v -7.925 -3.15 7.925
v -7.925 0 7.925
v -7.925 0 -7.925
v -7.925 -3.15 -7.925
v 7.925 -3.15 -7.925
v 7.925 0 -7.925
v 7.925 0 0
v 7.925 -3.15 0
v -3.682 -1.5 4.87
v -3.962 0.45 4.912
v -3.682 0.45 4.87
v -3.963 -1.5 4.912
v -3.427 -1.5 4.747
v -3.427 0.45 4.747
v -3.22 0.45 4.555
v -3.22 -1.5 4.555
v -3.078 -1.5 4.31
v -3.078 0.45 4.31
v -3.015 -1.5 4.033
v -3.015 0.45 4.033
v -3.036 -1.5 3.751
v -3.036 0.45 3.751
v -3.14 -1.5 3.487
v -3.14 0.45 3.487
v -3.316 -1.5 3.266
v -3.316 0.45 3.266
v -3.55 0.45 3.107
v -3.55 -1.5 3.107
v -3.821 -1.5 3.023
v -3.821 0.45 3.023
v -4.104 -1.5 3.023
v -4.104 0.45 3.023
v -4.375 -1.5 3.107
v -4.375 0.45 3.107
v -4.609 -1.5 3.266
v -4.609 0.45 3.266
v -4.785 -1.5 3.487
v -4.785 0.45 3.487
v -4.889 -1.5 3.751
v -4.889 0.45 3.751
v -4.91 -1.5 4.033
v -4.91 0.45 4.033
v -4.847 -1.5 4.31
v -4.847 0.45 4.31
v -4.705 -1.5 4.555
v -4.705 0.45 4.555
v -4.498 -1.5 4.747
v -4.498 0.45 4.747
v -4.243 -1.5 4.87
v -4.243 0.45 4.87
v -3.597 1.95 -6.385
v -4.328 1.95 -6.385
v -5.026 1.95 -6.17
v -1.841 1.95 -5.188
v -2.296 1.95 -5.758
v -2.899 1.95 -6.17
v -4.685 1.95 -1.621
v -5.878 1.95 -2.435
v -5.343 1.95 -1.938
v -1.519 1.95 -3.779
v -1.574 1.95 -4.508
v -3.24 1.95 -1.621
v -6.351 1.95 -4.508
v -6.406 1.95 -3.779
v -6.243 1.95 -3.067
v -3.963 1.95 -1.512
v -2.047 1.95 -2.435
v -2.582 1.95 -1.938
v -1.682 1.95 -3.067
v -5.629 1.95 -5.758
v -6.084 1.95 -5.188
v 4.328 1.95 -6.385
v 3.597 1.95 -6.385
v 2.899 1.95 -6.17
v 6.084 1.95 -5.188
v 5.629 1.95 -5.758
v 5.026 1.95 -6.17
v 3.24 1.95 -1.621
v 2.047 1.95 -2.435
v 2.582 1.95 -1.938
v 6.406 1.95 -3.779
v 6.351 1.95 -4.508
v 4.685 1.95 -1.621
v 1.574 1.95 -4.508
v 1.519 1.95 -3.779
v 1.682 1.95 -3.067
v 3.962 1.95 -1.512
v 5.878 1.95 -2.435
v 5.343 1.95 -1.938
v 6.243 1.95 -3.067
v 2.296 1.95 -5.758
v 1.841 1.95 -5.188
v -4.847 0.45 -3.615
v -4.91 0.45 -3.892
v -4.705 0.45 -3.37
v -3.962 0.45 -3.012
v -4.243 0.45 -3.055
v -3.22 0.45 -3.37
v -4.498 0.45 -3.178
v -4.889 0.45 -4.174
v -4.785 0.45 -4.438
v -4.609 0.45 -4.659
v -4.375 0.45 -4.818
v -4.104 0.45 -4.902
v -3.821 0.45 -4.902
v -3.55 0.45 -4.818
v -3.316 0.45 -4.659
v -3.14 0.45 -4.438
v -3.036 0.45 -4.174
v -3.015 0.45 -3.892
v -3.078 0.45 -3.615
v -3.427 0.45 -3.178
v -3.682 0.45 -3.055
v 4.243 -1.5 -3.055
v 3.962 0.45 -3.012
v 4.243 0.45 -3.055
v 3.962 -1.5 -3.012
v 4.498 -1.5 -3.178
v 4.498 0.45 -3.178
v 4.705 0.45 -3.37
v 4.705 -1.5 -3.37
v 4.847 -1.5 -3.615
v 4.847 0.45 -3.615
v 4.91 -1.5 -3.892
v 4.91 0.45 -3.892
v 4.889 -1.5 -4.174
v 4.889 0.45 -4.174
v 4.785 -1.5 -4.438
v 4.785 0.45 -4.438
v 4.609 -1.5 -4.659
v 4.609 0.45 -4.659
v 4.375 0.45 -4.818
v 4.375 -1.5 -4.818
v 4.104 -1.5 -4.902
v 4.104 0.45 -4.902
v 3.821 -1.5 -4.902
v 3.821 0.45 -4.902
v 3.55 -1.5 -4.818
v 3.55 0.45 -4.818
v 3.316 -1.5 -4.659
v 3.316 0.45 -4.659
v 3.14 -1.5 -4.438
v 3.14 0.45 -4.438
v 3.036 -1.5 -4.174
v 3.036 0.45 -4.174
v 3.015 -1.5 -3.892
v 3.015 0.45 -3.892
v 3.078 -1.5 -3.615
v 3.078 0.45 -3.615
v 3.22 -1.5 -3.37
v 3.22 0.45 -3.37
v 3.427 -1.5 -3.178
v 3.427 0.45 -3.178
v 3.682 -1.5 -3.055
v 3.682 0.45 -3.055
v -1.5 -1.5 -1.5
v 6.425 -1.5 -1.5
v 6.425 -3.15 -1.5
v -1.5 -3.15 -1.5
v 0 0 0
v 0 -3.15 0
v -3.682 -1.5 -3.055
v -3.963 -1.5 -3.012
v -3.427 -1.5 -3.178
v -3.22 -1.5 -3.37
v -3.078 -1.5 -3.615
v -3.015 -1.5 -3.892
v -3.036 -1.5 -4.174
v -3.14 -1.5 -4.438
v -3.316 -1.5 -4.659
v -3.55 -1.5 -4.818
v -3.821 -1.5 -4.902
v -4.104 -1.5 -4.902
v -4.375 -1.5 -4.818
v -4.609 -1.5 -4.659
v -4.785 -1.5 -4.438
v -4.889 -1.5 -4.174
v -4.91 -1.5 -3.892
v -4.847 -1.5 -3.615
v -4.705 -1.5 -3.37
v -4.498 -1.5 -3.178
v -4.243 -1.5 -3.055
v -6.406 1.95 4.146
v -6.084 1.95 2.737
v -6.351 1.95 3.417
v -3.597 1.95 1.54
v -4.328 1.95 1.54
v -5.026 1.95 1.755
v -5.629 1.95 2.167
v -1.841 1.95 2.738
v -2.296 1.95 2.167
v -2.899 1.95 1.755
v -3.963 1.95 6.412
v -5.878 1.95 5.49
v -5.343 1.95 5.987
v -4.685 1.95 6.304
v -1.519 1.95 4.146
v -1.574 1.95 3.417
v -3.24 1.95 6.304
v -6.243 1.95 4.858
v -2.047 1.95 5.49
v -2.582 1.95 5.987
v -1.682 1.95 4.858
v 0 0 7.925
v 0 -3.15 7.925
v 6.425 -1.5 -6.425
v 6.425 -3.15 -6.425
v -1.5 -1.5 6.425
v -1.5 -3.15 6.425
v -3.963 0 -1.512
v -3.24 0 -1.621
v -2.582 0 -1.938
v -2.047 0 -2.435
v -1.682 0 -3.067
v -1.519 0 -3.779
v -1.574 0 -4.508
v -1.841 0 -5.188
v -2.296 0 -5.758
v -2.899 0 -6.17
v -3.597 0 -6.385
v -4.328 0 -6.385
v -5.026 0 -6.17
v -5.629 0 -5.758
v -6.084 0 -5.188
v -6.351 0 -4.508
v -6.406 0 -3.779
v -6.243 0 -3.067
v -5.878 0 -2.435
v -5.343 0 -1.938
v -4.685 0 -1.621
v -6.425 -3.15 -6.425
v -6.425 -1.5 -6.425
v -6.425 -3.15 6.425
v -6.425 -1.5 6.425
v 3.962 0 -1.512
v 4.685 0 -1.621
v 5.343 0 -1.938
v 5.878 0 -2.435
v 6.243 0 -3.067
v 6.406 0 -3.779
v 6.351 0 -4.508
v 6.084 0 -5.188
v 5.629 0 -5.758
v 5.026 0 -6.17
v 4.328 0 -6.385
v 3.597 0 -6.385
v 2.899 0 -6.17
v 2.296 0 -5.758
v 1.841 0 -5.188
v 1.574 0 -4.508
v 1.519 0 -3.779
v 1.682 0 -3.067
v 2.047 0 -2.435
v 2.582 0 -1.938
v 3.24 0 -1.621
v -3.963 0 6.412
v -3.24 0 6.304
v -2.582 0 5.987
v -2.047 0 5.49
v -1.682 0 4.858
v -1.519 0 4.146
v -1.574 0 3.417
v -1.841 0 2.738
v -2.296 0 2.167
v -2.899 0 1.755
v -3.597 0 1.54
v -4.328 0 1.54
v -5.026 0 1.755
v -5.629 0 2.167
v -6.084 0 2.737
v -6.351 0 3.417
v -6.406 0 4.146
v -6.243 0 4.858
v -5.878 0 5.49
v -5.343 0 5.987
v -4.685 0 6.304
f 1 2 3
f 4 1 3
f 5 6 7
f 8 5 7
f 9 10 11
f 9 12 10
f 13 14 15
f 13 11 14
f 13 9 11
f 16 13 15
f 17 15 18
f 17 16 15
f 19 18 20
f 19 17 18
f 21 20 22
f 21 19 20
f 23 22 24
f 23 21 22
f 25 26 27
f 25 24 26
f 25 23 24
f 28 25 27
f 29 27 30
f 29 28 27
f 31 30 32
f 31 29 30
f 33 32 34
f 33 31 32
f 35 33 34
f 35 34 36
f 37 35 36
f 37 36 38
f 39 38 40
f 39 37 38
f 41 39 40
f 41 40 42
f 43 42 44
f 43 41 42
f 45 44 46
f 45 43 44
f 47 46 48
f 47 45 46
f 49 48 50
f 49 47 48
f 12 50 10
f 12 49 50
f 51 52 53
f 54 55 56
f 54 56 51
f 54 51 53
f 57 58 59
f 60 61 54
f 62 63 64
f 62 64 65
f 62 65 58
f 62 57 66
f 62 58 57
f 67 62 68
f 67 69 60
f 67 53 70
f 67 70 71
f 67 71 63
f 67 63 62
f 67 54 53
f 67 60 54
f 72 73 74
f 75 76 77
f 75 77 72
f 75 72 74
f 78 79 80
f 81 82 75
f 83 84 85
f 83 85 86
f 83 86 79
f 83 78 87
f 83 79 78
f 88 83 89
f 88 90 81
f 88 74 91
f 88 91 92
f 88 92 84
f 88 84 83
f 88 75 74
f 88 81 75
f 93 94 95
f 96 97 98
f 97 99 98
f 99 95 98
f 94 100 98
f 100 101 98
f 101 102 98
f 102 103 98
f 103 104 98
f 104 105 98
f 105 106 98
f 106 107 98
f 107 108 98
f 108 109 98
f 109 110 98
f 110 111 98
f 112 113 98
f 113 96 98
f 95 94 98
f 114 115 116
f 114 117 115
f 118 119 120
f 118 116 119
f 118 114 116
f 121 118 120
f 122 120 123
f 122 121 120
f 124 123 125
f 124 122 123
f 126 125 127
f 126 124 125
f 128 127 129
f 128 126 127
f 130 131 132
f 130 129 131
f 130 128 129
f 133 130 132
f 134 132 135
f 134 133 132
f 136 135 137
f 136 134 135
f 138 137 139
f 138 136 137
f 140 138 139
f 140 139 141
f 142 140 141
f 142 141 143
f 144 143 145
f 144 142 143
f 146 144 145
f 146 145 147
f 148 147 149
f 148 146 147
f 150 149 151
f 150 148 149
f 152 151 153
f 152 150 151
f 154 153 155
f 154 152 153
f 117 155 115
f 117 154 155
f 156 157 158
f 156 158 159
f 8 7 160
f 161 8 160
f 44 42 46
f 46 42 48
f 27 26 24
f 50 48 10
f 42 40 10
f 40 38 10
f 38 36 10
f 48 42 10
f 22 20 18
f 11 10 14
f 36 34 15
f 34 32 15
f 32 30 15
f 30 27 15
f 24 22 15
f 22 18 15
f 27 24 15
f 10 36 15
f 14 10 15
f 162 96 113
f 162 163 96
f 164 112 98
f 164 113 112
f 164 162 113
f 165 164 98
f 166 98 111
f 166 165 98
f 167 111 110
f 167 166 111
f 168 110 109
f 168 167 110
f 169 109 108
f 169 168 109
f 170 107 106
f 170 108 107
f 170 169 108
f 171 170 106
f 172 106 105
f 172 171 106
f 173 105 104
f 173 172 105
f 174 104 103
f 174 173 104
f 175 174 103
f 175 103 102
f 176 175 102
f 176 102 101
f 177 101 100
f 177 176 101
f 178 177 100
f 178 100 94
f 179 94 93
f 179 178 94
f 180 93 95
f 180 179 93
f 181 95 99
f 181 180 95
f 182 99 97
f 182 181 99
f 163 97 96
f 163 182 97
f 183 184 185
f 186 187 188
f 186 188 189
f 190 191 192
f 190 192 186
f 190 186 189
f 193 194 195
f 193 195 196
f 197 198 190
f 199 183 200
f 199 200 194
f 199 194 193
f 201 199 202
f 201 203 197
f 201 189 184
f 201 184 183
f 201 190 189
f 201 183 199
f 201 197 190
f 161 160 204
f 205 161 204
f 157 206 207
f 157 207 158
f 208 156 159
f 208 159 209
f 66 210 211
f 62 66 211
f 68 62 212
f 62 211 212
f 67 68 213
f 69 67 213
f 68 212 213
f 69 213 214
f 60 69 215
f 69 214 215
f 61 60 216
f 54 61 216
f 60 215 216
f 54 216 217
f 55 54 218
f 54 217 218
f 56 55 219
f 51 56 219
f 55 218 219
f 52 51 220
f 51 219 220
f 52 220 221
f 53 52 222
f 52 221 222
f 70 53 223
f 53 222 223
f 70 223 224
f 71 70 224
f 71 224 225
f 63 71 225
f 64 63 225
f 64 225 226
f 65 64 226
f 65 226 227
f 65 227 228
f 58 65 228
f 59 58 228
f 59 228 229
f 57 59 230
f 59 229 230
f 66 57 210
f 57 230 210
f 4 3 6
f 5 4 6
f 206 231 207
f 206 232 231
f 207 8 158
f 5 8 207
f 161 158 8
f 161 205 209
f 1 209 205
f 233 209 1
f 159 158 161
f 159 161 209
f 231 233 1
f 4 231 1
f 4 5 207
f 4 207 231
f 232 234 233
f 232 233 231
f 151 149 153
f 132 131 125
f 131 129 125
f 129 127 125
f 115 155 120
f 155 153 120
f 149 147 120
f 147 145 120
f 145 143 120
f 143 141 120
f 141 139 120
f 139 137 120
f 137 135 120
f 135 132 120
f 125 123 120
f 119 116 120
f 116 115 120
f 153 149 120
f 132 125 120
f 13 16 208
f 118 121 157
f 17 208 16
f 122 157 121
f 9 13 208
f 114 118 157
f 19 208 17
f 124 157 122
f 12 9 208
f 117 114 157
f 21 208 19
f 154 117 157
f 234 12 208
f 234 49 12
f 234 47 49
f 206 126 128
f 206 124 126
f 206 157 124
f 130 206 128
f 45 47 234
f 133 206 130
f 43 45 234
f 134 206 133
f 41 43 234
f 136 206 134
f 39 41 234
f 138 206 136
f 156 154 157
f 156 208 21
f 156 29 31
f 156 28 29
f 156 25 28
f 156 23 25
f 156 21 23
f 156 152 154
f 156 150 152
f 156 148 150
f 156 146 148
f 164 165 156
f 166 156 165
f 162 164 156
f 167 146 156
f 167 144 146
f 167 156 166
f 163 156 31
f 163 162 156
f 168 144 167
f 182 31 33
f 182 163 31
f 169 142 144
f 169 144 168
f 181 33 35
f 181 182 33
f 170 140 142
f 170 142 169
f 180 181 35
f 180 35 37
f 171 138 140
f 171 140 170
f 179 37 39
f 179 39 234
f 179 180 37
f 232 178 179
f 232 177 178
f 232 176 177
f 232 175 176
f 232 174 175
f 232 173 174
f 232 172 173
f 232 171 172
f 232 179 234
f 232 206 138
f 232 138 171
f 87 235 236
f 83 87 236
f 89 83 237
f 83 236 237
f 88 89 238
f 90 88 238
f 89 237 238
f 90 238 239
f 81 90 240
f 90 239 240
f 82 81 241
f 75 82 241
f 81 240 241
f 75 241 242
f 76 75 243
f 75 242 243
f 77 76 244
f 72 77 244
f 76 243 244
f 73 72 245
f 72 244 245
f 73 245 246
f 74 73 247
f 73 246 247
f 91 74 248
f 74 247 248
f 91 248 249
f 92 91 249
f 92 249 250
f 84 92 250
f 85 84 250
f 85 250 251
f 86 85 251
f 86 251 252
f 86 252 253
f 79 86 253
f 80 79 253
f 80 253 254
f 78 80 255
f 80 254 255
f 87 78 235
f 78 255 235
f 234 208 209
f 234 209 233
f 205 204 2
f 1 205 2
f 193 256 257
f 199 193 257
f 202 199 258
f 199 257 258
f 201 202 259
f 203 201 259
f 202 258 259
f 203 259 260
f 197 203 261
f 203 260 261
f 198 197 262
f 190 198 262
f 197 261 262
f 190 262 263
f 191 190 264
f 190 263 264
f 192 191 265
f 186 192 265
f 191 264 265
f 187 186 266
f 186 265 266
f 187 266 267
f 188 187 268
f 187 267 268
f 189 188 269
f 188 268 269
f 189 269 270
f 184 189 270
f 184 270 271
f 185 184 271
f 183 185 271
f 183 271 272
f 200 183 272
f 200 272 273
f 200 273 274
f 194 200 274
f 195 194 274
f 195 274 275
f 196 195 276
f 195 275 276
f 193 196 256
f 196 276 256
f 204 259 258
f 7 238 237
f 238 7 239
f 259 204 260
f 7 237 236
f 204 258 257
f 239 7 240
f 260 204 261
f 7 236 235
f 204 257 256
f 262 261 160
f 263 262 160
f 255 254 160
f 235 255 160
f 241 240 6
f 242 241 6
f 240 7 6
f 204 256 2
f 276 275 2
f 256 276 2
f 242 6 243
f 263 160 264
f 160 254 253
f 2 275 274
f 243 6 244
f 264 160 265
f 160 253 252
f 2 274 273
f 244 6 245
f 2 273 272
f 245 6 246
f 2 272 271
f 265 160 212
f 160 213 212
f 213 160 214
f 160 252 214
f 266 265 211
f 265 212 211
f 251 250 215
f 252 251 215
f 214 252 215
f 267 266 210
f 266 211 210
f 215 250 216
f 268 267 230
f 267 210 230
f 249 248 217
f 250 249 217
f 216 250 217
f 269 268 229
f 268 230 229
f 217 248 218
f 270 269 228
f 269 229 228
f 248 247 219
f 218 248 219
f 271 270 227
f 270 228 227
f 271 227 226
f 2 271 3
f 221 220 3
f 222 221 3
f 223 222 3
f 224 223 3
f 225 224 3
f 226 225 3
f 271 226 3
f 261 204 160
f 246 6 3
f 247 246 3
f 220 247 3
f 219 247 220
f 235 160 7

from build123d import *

# Parameters (mm, degrees)
BOSS_EXTRUDE1_DEPTH = 3.15
SKETCH3_R           = 2.45
BOSS_EXTRUDE2_DEPTH = 1.95
SHELL1_T            = -1.5


with BuildPart() as part:
    # Sketch2 → Boss-Extrude1 (new body)
    with BuildSketch(Plane(origin=(0, 0, 0), x_dir=(1, 0, 0), z_dir=(0, 1, 0))):
        Polygon((0, 0), (0, -7.925), (-7.925, -7.925), (-7.925, 7.925), (7.925, 7.925), (7.925, 0), align=None)
    extrude(amount=-BOSS_EXTRUDE1_DEPTH)

    # Sketch3 → Boss-Extrude2 (add)
    with BuildSketch(Plane(origin=(0, 0, 0), x_dir=(1, 0, 0), z_dir=(0, 1, 0))):
        with Locations(Location((-3.9625, 3.9625, 0), (0, 0, 270))):
            Circle(SKETCH3_R)
        with Locations(Location((3.9625, 3.9625, 0), (0, 0, 270))):
            Circle(SKETCH3_R)
        with Locations(Location((-3.9625, -3.9625, 0), (0, 0, 270))):
            Circle(SKETCH3_R)
    extrude(amount=BOSS_EXTRUDE2_DEPTH)

    # Shell1
    shell1_openings = [part.faces().sort_by_distance(p)[0] for p in [
        (-1.320833333, -3.15, -1.320833333),
    ]]
    offset(amount=SHELL1_T, openings=shell1_openings, kind=Kind.INTERSECTION)


solid = part.part
